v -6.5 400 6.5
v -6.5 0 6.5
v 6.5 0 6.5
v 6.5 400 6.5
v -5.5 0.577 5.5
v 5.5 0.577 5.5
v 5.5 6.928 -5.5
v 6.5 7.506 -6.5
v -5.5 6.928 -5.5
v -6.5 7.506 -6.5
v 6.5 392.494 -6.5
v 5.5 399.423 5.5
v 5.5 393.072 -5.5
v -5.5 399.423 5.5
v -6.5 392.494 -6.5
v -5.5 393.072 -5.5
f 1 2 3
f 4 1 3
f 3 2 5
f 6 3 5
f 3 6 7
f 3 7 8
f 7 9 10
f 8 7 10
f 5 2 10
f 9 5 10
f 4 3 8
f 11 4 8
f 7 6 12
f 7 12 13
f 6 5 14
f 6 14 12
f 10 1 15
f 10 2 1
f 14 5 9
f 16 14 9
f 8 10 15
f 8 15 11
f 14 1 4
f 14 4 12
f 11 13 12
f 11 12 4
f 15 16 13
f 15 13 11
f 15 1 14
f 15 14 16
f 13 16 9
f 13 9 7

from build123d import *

# Parameters (mm, degrees)
SKETCH1_W               = 13
SKETCH1_H               = 13
SKETCH1_W_2             = 11
SKETCH1_H_2             = 11
BOSS_EXTRUDE1_DEPTH     = 400
CUT_EXTRUDE1_DEPTH      = 1
CUT_EXTRUDE1_DEPTH_BACK = 14
CUT_EXTRUDE3_DEPTH      = 1
CUT_EXTRUDE3_DEPTH_BACK = 14


with BuildPart() as part:
    # Sketch1 → Boss-Extrude1 (new body)
    with BuildSketch(Plane(origin=(0, 0, 0), x_dir=(1, 0, 0), z_dir=(0, 1, 0))):
        Rectangle(SKETCH1_W, SKETCH1_H)
        Rectangle(SKETCH1_W_2, SKETCH1_H_2, mode=Mode.SUBTRACT)
    extrude(amount=BOSS_EXTRUDE1_DEPTH)

    # Sketch2 → Cut-Extrude1 (cut, two sides)
    with BuildSketch(Plane.ZY.offset(6.5)) as cut_extrude1_sk:
        Polygon((708.34637623, 805.211194246), (6.5, 400), (-6.5, 392.494446501), (-708.34637623, -12.716747746), (-1518.768764723, 1390.976004715), (-102.076012262, 2208.903946707), align=None)
    extrude(amount=CUT_EXTRUDE1_DEPTH, mode=Mode.SUBTRACT)
    extrude(cut_extrude1_sk.sketch, amount=-CUT_EXTRUDE1_DEPTH_BACK, mode=Mode.SUBTRACT)

    # Sketch3 → Cut-Extrude3 (cut, two sides)
    with BuildSketch(Plane.ZY.offset(6.5)) as cut_extrude3_sk:
        Polygon((708.34637623, -405.211194246), (6.5, 0), (-6.5, 7.505553499), (-708.34637623, 412.716747746), (-1518.768764723, -990.976004715), (-102.076012262, -1808.903946707), align=None)
    extrude(amount=CUT_EXTRUDE3_DEPTH, mode=Mode.SUBTRACT)
    extrude(cut_extrude3_sk.sketch, amount=-CUT_EXTRUDE3_DEPTH_BACK, mode=Mode.SUBTRACT)


solid = part.part
